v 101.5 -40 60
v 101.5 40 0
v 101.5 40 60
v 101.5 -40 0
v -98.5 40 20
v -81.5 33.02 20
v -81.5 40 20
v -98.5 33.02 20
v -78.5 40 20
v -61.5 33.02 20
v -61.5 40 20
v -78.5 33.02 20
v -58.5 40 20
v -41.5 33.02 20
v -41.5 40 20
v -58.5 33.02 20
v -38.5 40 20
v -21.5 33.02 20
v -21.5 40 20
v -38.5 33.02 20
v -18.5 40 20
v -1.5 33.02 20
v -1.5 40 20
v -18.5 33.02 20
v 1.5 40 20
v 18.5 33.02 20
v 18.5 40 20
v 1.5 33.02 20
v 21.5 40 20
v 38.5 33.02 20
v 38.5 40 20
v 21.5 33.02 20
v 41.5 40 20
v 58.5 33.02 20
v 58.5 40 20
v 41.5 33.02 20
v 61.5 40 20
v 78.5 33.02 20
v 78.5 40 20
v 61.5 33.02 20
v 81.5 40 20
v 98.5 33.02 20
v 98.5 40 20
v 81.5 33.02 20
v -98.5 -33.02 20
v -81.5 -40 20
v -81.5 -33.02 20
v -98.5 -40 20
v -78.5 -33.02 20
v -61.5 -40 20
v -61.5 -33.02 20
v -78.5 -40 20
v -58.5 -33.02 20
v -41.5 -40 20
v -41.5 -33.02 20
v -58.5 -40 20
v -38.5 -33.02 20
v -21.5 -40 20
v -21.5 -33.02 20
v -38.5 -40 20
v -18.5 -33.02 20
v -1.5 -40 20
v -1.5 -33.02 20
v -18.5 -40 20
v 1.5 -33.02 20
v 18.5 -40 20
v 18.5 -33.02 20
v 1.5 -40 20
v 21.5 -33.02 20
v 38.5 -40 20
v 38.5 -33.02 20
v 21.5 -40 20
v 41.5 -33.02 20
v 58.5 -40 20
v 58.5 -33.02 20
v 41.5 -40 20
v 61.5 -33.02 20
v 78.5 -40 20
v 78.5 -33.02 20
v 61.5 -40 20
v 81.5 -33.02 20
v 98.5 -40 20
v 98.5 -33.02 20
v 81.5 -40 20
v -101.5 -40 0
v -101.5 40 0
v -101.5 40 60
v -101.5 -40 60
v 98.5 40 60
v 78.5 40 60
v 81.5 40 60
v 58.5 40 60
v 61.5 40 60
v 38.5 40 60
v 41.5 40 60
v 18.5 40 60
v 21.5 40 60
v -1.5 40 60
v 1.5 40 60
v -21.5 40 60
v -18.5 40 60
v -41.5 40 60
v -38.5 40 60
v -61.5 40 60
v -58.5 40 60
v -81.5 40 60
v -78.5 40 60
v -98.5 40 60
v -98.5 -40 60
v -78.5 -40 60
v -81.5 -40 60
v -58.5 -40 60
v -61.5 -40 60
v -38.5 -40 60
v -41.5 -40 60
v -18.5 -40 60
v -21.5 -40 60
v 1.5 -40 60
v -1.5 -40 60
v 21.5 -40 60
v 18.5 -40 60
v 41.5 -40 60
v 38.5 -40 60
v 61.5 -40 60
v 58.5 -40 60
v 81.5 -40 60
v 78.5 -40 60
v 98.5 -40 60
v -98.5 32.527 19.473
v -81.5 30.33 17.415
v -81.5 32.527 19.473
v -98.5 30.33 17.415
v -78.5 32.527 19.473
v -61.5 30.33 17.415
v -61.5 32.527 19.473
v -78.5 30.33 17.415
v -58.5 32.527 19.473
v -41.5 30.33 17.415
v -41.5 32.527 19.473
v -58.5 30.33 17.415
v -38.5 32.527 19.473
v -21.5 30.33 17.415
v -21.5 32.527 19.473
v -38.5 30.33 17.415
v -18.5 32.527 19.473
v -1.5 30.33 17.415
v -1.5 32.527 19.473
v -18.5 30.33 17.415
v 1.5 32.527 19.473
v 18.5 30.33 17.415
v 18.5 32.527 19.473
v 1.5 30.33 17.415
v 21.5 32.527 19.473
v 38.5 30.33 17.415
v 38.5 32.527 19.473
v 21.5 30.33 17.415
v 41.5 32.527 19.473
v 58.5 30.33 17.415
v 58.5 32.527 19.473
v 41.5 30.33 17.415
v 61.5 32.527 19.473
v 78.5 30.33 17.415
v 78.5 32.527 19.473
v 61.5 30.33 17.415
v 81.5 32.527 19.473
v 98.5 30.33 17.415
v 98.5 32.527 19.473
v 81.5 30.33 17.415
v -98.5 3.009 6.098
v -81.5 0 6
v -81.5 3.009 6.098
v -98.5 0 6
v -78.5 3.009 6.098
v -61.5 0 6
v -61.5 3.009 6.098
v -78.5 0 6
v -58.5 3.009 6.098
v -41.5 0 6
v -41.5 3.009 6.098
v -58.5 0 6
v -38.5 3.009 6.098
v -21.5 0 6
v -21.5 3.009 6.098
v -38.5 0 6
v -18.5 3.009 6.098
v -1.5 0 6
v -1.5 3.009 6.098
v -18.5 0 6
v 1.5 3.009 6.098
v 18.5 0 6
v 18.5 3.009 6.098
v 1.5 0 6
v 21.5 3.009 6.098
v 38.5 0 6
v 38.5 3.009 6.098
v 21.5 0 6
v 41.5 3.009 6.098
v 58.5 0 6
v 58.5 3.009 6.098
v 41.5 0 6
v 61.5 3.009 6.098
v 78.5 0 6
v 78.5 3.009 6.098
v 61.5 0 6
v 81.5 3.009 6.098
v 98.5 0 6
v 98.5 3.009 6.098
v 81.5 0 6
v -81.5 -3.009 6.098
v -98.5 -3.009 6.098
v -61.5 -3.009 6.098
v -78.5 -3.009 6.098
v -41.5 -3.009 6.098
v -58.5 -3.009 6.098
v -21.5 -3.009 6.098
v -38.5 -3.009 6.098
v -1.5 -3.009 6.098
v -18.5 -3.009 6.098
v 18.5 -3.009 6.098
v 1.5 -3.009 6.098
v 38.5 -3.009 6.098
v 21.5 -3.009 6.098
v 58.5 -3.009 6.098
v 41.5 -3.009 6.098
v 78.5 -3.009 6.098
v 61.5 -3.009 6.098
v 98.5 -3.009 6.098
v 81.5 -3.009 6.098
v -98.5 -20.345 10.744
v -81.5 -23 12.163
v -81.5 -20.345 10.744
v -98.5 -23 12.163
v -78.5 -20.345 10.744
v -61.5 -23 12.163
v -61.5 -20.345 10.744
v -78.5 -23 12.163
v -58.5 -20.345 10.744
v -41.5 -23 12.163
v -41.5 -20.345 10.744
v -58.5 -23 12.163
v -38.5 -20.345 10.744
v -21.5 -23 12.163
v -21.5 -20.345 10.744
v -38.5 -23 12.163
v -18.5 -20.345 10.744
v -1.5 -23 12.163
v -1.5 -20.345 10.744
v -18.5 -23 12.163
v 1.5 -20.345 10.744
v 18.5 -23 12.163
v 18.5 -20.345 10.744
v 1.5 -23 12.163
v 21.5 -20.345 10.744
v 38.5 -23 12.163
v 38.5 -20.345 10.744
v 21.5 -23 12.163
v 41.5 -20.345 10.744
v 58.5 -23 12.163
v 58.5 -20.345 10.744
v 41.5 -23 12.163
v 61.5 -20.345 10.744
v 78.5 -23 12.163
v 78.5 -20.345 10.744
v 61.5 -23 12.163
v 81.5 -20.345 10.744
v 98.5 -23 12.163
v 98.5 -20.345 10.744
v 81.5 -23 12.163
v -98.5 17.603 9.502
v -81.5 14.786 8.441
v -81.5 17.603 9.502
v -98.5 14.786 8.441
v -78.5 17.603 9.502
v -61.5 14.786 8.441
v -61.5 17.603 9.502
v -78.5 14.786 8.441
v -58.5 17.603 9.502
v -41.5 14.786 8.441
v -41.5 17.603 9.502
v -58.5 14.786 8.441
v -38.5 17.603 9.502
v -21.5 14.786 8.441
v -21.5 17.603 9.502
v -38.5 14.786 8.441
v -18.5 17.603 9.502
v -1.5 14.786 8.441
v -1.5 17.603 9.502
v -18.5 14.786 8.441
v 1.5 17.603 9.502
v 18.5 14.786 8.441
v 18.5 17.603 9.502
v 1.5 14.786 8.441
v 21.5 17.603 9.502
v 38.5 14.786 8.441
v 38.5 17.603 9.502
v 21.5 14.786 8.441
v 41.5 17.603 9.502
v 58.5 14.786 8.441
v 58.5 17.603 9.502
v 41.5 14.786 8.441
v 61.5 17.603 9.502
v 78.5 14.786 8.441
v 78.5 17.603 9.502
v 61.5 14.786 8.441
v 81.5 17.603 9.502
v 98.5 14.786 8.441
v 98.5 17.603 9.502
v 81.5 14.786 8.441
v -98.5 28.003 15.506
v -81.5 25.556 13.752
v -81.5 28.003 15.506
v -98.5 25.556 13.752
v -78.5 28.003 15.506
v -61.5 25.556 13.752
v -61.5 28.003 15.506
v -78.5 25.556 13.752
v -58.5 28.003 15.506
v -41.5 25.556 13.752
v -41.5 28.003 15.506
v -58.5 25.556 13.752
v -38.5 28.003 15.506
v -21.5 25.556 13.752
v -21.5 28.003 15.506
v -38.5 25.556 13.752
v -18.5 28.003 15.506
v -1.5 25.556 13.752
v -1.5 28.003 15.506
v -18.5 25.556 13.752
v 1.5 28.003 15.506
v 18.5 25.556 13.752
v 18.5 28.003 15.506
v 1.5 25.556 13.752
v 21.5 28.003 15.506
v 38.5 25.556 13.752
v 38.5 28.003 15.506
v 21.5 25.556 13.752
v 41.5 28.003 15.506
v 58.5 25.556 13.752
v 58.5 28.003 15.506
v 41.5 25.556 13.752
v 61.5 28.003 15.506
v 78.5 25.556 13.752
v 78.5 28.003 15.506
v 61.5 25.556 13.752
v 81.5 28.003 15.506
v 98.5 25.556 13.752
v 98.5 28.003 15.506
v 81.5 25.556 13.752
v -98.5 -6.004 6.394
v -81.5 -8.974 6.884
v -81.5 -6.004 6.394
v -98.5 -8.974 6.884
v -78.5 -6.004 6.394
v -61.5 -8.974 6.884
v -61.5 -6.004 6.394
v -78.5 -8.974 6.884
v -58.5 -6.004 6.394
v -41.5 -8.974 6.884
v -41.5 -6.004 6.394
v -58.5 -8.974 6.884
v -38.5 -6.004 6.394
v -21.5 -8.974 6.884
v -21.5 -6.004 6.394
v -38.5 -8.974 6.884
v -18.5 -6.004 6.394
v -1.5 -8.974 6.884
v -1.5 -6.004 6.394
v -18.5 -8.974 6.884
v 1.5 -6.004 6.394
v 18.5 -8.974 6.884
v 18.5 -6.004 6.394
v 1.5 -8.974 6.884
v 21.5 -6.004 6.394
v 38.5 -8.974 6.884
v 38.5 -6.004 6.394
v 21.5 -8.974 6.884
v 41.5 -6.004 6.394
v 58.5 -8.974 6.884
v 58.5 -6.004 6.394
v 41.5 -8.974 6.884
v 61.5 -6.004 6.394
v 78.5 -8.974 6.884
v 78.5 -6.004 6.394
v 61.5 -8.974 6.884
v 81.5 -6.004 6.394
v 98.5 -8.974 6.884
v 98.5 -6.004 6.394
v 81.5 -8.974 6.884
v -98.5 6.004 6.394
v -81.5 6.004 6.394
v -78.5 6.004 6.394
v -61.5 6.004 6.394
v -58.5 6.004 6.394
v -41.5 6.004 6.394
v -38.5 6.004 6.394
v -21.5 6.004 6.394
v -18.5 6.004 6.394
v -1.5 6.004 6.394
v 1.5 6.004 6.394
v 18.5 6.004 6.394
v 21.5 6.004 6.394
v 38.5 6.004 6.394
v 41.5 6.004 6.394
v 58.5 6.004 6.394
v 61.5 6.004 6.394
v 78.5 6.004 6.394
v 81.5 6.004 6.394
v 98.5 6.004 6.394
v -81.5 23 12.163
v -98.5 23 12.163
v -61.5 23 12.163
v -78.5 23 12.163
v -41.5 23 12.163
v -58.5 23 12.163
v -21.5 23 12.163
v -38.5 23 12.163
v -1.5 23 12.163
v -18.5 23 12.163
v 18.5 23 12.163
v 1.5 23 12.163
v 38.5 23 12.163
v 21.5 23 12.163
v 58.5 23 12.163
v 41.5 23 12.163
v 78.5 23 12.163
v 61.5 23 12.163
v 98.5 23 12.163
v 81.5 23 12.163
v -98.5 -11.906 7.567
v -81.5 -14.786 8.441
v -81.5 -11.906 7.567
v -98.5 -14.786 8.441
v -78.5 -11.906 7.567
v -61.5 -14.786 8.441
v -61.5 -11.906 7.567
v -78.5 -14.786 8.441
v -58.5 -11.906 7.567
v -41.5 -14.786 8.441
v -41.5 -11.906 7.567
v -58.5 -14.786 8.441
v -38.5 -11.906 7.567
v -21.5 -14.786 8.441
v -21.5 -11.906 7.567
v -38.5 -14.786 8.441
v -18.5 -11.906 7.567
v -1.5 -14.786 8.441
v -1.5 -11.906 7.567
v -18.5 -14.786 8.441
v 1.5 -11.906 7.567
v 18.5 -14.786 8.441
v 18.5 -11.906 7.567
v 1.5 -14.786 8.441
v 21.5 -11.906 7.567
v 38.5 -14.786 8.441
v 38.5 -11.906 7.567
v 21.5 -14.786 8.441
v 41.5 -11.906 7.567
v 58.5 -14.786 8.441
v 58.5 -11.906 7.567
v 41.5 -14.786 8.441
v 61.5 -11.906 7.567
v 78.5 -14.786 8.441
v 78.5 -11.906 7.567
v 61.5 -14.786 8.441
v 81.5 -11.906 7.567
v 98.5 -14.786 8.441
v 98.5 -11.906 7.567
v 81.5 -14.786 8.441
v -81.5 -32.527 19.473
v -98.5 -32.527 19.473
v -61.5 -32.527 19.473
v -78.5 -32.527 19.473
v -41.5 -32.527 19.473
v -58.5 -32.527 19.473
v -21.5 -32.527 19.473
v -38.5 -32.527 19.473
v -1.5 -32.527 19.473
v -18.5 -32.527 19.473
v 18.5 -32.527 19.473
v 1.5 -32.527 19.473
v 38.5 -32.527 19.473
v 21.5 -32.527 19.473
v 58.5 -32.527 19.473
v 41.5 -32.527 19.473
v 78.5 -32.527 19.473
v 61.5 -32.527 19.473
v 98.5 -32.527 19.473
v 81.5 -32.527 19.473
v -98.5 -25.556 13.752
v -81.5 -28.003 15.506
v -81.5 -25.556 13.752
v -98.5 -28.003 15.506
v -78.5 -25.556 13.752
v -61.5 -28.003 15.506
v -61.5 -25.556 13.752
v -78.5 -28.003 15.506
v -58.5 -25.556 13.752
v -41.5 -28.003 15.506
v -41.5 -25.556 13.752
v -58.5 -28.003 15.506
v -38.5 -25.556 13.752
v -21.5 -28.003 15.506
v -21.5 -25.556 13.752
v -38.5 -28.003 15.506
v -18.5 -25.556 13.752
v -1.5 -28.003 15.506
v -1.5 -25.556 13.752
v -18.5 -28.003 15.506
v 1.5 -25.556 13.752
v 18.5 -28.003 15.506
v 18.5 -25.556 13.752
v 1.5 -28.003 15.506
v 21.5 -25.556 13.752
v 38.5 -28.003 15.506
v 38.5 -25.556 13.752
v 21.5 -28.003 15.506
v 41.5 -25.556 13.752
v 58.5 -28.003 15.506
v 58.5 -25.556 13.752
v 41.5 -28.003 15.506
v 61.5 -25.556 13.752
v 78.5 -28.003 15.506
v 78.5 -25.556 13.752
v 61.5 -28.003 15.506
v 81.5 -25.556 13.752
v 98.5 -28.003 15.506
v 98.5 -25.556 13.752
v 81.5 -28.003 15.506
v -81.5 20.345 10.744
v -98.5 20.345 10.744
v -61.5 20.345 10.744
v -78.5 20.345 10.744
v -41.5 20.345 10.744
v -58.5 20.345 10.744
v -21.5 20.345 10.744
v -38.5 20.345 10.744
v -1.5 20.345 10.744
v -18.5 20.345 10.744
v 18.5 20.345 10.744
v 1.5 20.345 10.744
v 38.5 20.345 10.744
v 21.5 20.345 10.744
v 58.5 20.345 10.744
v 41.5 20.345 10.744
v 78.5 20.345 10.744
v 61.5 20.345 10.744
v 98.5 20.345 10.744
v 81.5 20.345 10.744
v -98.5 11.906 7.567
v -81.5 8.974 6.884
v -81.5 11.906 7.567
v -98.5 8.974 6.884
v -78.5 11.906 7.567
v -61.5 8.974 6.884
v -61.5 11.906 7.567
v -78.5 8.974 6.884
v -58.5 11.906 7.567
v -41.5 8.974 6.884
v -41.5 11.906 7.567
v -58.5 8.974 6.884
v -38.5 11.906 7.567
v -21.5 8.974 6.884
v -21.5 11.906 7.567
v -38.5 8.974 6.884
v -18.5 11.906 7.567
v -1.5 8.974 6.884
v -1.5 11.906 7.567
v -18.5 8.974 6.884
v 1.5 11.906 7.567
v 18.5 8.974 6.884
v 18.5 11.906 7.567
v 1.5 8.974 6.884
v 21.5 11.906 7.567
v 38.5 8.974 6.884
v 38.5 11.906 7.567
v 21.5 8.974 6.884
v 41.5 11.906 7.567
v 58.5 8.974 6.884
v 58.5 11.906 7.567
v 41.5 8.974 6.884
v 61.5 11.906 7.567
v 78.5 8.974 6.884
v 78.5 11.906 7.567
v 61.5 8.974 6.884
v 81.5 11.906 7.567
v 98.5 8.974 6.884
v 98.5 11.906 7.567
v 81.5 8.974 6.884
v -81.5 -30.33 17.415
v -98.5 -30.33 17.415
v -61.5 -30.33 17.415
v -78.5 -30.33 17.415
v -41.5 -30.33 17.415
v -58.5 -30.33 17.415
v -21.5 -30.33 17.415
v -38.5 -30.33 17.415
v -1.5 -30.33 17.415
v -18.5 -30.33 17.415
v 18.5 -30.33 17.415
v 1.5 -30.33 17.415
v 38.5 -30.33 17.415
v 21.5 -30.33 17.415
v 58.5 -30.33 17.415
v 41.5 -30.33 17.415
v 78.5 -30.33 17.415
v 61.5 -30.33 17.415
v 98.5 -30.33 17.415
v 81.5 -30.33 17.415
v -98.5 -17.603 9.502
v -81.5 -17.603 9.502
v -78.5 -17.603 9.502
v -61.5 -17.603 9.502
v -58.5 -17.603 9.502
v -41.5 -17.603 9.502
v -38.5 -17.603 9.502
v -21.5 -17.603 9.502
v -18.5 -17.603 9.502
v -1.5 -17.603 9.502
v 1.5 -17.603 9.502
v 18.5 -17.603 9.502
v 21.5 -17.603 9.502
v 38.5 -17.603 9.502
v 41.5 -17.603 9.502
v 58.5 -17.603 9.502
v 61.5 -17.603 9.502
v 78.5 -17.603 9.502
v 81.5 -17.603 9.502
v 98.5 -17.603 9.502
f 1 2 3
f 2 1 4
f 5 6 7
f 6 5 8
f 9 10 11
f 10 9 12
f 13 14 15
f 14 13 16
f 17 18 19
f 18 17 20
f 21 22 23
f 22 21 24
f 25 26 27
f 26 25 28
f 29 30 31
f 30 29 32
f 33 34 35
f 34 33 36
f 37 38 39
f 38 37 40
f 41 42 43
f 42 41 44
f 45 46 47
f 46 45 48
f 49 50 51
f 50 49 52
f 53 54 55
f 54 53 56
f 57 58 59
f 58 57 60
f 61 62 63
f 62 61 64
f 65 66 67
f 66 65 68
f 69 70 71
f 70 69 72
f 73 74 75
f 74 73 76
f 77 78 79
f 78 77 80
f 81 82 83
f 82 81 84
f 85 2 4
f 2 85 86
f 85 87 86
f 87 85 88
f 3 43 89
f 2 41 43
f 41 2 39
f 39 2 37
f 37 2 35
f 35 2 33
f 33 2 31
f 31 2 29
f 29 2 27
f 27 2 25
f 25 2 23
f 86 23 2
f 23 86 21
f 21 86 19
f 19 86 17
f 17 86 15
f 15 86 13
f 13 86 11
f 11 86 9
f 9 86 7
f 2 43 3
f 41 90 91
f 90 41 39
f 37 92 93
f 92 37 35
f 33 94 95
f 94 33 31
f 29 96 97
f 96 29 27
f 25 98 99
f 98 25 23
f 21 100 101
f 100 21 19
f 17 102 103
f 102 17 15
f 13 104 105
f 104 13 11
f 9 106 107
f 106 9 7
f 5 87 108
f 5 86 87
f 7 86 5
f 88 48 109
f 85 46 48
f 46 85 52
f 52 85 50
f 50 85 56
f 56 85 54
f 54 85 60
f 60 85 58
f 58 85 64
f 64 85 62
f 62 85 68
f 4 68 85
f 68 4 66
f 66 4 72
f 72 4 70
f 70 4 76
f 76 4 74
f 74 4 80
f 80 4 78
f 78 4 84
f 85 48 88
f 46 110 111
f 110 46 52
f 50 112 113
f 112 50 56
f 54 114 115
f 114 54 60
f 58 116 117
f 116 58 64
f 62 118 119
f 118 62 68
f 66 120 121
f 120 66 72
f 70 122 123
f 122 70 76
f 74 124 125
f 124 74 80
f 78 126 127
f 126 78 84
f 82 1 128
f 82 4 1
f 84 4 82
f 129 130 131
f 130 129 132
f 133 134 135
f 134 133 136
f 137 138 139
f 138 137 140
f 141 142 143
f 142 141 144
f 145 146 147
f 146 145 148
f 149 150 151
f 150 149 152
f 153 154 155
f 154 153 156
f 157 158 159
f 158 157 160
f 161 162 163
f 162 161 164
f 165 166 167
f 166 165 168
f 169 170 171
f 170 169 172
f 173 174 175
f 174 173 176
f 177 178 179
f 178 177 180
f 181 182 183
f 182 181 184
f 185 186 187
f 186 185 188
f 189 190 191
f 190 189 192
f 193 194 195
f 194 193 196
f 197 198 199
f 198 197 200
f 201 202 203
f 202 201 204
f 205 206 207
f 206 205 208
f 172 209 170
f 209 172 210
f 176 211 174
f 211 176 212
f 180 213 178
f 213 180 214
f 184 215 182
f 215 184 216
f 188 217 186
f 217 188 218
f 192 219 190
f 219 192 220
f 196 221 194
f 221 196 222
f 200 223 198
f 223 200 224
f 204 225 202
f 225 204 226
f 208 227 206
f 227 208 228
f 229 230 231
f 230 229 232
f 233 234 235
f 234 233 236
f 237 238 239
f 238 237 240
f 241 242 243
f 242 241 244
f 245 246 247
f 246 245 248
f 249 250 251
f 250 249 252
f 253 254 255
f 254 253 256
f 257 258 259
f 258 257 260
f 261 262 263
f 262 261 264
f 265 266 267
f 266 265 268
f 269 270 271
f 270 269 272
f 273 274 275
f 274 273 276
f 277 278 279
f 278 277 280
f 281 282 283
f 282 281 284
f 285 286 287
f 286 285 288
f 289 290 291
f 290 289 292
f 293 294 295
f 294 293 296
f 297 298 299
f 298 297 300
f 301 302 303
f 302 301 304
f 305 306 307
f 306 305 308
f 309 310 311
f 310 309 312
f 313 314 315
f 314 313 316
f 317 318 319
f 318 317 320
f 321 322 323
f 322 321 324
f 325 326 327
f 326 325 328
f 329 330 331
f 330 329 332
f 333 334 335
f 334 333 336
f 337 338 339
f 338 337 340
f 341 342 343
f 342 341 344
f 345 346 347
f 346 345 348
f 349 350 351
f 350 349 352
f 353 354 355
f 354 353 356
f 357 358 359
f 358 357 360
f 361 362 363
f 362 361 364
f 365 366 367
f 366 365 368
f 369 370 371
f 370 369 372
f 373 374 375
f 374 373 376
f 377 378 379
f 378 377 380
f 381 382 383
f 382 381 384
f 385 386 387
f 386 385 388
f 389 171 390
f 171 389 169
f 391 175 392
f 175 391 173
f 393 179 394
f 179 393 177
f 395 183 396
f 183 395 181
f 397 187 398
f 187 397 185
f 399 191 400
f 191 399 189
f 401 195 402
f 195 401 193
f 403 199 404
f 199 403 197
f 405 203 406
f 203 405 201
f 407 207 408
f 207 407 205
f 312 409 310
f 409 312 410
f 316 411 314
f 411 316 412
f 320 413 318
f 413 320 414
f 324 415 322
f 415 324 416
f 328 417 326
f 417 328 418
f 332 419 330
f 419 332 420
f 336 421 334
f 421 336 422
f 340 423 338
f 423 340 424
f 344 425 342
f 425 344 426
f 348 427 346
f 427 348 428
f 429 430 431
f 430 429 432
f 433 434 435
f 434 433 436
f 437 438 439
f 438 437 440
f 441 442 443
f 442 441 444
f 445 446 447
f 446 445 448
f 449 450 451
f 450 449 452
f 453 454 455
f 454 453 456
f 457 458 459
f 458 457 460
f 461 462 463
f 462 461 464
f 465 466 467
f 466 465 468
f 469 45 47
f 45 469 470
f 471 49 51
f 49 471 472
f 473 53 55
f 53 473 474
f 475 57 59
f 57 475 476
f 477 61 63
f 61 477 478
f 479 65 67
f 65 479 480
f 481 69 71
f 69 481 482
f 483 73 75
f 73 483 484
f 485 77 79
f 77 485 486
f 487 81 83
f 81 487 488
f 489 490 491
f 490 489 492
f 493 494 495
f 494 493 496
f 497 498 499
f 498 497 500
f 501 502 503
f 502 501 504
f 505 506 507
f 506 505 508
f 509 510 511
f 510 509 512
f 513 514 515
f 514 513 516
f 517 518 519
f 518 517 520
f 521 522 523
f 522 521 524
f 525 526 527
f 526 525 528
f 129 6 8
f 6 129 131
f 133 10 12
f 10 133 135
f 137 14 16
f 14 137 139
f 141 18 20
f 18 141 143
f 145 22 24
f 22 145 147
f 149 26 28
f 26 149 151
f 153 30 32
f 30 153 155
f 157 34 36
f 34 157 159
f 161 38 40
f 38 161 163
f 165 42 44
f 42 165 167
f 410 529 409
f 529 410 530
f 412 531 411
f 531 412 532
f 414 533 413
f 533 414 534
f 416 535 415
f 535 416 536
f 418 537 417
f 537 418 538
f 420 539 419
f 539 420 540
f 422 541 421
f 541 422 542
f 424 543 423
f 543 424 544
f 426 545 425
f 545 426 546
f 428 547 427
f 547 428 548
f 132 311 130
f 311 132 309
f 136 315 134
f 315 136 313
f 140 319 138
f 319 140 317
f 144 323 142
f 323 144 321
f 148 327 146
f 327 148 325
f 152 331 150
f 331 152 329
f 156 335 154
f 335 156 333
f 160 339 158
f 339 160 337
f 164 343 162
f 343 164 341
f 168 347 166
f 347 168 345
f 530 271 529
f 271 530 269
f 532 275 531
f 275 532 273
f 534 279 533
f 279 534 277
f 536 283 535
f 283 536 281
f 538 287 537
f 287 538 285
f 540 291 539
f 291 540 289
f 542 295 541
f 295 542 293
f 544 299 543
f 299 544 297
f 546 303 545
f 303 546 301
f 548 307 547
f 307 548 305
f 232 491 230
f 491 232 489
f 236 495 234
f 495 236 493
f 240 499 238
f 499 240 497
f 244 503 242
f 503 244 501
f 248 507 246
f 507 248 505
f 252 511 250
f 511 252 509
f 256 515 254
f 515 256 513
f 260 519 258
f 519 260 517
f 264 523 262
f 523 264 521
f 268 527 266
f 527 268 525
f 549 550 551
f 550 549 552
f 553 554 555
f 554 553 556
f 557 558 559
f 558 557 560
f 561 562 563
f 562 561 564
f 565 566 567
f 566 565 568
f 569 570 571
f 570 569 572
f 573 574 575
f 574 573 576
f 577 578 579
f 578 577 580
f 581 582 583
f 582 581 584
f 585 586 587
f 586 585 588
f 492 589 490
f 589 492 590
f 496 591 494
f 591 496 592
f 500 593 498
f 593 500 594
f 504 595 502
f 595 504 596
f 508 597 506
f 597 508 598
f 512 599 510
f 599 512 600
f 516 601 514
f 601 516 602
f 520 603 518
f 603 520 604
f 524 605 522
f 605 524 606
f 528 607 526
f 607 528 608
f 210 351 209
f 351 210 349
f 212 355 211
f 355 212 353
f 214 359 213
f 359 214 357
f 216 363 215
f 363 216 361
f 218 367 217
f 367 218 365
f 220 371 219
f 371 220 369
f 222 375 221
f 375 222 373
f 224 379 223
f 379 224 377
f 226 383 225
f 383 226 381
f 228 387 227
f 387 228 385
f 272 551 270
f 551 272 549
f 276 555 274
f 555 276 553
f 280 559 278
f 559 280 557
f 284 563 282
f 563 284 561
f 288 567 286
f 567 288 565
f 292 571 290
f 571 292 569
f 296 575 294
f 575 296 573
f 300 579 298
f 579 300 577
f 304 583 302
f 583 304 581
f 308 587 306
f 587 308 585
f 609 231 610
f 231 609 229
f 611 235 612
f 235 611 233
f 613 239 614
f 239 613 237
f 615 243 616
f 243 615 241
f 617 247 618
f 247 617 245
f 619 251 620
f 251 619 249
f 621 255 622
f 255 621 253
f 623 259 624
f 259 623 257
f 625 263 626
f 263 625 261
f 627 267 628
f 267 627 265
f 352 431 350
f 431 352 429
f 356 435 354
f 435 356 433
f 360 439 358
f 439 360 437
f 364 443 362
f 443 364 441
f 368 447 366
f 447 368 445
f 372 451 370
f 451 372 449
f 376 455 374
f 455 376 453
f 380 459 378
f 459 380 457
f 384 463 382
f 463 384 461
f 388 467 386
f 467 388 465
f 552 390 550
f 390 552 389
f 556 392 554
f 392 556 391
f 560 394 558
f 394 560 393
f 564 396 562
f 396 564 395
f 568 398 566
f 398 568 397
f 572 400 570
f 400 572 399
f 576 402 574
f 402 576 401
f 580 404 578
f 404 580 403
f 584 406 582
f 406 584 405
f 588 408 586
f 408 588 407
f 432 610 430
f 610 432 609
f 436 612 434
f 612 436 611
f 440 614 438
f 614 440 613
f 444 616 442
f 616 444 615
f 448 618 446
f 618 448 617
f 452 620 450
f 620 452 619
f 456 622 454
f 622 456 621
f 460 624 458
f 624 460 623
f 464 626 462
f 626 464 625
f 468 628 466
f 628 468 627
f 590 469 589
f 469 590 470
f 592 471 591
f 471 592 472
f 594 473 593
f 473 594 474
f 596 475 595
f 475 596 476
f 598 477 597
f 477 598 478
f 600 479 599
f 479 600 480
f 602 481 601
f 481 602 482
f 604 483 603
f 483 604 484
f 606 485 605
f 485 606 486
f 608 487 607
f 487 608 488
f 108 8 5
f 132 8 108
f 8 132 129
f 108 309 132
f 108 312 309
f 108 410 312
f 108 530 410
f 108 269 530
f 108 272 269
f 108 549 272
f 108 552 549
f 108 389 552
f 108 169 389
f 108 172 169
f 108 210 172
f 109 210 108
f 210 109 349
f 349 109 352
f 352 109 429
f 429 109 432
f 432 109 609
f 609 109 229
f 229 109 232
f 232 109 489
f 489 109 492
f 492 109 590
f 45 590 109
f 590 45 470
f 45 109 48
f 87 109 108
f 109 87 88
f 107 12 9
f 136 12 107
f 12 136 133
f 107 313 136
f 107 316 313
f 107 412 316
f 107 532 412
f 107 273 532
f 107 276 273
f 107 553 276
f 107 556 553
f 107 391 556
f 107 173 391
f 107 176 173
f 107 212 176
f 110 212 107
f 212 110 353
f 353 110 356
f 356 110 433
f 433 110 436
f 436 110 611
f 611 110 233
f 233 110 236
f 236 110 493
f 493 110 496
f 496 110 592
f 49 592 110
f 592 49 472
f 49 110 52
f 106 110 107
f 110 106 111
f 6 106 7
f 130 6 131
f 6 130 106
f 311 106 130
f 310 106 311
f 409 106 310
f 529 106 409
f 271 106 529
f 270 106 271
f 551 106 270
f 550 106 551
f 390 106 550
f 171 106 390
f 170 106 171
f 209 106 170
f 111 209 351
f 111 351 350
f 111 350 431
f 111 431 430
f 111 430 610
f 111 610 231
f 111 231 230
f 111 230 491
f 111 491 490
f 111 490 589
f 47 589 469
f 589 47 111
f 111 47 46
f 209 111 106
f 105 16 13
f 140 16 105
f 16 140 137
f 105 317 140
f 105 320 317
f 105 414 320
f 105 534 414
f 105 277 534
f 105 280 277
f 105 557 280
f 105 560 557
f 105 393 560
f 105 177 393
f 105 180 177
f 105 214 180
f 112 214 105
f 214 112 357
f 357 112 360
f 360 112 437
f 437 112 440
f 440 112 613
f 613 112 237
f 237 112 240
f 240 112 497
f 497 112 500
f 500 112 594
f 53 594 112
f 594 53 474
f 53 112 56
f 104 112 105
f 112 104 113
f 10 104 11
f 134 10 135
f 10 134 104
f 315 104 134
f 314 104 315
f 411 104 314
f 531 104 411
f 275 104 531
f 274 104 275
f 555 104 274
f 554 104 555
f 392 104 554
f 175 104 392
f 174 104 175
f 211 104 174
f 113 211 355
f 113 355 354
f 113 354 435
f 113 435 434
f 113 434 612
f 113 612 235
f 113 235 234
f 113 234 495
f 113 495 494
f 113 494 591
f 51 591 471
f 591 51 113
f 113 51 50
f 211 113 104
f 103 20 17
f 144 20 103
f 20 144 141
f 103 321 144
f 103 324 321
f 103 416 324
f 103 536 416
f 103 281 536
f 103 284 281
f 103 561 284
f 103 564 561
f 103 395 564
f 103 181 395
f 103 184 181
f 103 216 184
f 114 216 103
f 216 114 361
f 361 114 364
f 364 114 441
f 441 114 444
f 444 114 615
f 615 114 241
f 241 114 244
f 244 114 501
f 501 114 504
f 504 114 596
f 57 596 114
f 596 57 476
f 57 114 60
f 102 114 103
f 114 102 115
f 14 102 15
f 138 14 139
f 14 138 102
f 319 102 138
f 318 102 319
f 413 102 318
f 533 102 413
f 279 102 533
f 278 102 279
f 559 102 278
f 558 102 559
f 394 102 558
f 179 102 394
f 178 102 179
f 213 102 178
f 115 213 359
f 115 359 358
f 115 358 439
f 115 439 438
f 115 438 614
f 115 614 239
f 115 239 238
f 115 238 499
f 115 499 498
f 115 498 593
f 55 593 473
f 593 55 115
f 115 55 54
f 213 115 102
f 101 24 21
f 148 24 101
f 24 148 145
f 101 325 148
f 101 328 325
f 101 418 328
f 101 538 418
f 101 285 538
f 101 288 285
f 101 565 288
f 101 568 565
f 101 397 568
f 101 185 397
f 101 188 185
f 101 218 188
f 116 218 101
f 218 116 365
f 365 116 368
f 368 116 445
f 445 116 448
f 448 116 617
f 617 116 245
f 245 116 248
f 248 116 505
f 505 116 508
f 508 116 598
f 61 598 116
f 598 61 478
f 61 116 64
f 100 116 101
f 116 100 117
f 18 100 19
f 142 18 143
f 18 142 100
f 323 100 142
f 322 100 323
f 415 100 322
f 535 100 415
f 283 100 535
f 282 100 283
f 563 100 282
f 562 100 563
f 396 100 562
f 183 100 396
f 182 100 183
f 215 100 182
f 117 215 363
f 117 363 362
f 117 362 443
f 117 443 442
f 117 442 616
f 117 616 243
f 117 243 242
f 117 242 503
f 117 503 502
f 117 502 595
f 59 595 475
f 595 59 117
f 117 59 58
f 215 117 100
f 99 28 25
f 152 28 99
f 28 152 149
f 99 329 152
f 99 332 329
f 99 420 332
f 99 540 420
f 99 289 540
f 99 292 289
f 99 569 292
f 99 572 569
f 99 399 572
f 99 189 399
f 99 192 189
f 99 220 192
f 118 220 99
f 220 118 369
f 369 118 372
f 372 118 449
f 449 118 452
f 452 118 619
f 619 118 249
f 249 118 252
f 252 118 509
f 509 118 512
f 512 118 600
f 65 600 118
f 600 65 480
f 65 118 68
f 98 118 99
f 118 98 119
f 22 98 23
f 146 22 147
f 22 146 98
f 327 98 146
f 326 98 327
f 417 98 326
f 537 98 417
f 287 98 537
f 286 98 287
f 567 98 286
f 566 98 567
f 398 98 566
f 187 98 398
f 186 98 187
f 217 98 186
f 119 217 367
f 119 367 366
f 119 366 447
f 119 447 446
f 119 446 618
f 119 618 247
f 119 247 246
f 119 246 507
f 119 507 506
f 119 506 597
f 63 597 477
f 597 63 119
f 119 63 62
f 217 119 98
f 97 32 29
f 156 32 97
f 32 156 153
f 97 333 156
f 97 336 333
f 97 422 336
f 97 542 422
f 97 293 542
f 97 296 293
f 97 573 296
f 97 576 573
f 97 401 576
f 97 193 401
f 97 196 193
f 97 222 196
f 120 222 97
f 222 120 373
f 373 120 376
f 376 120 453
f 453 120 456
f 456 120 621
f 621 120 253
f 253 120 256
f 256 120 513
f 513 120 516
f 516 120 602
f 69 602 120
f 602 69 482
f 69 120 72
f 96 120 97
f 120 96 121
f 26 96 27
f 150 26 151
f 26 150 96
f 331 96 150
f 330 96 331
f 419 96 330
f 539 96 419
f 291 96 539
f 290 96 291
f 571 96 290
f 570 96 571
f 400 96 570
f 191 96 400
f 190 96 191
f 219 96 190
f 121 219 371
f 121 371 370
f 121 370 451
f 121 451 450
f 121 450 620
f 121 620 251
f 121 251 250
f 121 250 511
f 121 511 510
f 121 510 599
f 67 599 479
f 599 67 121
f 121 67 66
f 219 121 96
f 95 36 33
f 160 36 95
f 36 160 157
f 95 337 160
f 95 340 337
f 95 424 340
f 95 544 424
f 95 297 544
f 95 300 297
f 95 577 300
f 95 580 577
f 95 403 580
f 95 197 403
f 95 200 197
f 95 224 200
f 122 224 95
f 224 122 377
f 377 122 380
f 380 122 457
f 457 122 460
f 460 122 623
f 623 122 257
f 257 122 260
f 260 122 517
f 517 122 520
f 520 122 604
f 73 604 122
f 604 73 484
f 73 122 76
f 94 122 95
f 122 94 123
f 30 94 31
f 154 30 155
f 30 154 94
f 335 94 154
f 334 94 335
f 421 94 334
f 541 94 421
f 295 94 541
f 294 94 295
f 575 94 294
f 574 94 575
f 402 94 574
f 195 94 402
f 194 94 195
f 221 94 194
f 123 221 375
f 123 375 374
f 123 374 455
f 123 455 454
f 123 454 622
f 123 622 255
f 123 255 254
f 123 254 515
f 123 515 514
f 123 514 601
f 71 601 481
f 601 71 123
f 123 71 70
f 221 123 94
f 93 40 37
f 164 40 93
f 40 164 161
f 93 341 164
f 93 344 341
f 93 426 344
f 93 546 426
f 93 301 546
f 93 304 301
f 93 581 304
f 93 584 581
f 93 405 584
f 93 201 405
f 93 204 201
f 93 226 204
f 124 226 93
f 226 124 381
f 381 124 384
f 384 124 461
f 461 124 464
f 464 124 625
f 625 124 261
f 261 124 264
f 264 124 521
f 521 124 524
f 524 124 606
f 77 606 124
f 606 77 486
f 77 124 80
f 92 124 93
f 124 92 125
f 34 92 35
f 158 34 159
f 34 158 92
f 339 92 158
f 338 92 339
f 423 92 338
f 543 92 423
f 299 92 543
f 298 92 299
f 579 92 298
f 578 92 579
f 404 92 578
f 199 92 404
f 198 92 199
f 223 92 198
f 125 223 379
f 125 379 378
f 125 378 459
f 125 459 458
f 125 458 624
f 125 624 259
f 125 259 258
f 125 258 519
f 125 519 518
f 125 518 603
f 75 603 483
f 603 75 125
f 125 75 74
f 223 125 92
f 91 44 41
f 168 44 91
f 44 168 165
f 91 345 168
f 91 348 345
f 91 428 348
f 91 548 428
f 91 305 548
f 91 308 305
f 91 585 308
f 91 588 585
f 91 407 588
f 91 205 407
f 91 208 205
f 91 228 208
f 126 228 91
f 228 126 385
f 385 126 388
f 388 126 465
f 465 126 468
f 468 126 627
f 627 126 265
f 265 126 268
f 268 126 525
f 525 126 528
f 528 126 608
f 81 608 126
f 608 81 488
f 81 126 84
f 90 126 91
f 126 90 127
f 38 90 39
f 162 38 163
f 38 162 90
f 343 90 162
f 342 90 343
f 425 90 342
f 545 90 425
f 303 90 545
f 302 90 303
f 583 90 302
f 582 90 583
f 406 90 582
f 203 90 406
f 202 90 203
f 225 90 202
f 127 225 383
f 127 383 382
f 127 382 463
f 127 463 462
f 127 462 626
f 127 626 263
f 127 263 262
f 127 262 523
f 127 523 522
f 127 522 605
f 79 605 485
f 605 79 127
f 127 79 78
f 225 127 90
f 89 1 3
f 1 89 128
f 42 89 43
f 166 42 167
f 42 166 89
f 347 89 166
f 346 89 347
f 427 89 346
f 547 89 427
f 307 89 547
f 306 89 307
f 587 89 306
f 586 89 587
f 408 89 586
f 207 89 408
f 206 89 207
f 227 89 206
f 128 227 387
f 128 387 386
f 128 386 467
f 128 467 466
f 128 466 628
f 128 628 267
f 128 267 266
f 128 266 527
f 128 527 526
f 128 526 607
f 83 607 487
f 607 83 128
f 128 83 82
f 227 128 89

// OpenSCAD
// Petri dish rack: 10 x 90 mm dishes on edge

$fn = 96;

base_len    = 203;   // base length (X)
base_wid    = 80;    // base width (Y)
base_h      = 20;    // base height (Z)

cradle_r    = 46;    // cradle cylinder radius
cradle_z    = 52;    // cradle axis height (bottom at z = 6)

div_t       = 3;     // divider thickness (X)
div_w       = 80;    // divider width (Y)
div_h       = 60;    // divider height (Z)
div_pitch   = 20;    // divider spacing
div_count   = 11;    // number of dividers

over        = 1;     // cutter overshoot

// Base with cradle cut along its whole length
difference() {
    translate([-base_len/2, -base_wid/2, 0])
        cube([base_len, base_wid, base_h]);
    translate([-base_len/2 - over, 0, cradle_z])
        rotate([0, 90, 0])
            cylinder(r = cradle_r, h = base_len + 2*over);
}

// Solid divider plates (not cut by cradle)
for (i = [0 : div_count - 1]) {
    translate([-(div_count - 1)*div_pitch/2 + i*div_pitch - div_t/2, -div_w/2, 0])
        cube([div_t, div_w, div_h]);
}
